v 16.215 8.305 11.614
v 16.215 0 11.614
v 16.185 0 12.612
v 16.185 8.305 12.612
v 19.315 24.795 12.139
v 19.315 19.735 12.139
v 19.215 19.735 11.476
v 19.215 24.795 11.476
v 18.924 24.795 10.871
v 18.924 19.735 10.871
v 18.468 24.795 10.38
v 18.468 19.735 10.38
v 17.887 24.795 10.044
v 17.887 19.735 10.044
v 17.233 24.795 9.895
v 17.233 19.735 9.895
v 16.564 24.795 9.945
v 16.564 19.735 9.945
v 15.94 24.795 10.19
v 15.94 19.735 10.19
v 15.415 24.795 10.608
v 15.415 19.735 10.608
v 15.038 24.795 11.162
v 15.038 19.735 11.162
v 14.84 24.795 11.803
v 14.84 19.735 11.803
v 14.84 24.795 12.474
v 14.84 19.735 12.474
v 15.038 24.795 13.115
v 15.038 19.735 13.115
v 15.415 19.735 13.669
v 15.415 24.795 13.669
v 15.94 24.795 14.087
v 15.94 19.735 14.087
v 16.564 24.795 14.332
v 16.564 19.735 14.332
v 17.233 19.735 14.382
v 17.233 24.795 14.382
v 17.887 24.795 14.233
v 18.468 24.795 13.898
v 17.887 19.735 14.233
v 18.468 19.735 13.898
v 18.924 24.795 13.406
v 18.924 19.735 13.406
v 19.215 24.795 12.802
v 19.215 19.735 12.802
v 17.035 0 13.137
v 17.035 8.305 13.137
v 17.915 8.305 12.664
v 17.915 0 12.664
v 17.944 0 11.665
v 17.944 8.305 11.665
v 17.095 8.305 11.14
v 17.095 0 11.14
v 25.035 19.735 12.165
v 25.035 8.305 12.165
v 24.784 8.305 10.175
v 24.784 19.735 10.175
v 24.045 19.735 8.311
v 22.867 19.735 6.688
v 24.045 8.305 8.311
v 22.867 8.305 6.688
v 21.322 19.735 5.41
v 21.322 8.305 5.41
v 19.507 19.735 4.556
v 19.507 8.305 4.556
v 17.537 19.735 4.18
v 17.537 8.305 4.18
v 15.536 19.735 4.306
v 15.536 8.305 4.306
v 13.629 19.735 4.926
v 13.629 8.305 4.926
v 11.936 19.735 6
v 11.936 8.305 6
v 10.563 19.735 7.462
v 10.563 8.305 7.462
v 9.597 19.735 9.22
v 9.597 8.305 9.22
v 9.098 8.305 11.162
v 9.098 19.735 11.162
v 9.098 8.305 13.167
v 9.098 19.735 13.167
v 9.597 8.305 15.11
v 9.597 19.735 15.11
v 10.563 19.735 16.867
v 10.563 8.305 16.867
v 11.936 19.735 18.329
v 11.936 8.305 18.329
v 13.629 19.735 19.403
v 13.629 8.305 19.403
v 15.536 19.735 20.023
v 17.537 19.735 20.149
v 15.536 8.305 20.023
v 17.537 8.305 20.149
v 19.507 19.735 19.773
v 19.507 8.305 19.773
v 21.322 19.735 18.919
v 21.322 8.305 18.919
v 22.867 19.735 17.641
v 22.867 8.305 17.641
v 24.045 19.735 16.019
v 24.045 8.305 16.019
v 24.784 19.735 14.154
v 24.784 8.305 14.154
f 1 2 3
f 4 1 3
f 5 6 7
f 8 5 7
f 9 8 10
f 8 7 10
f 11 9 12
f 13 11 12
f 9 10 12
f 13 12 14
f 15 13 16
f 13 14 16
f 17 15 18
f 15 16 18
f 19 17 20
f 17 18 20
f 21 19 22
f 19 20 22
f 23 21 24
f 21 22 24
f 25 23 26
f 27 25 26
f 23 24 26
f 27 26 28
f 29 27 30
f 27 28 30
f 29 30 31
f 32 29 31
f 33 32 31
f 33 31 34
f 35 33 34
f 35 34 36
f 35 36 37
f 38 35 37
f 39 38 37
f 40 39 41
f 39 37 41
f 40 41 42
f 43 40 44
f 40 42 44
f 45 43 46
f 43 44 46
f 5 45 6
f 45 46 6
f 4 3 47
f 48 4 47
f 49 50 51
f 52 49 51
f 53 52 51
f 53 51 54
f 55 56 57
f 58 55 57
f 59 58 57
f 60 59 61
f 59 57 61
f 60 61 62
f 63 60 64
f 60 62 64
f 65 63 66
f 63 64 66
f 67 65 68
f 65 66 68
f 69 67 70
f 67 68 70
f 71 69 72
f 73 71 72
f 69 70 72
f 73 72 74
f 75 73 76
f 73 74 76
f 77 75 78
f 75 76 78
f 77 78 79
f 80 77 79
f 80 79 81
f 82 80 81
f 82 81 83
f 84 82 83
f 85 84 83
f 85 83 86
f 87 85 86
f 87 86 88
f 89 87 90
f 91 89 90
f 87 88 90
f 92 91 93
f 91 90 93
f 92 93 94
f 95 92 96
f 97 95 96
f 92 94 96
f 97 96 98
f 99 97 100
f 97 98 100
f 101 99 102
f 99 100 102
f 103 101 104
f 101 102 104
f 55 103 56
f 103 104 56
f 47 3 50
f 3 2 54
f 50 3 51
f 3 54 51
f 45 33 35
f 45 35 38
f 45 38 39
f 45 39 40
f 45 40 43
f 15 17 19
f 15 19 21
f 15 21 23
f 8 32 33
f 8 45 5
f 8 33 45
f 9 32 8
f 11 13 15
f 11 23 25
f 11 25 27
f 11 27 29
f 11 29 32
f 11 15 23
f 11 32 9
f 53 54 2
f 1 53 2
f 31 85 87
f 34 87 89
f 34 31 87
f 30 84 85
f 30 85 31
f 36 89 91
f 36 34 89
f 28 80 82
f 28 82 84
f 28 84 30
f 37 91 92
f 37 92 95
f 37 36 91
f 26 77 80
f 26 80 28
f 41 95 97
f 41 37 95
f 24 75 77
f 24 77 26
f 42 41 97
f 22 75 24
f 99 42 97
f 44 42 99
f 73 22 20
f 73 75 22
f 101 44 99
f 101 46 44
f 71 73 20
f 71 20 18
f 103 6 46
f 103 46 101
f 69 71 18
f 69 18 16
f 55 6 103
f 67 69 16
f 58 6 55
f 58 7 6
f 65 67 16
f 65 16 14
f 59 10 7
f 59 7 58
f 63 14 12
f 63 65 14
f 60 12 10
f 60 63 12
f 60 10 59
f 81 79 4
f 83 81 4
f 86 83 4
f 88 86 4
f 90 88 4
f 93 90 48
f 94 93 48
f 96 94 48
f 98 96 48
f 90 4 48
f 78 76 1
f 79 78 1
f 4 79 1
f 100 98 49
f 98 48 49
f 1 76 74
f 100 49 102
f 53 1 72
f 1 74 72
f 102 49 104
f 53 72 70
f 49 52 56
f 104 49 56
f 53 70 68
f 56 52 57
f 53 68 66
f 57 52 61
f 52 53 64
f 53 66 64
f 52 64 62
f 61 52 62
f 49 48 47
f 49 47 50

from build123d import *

# Parameters (mm, degrees)
BOSS_EXTRUDE1_DEPTH = 8.305
SKETCH2_R           = 8
BOSS_EXTRUDE2_DEPTH = 11.43
SKETCH3_R           = 2.25
BOSS_EXTRUDE3_DEPTH = 5.06


with BuildPart() as part:
    # Sketch1 → Boss-Extrude1 (new body)
    with BuildSketch(Plane(origin=(0, 0, 0), x_dir=(1, 0, 0), z_dir=(0, 1, 0))):
        Polygon((17.034949463, -13.137071019), (17.914502801, -12.66376429), (17.944383819, -11.665395391), (17.094711499, -11.140333221), (16.215158161, -11.61363995), (16.185277144, -12.612008849), align=None)
    extrude(amount=BOSS_EXTRUDE1_DEPTH)

    # Sketch2 → Boss-Extrude2 (add)
    with BuildSketch(Plane(origin=(0, 8.305, 0), x_dir=(1, 0, 0), z_dir=(0, 1, 0))):
        with Locations((17.034949463, -12.16457984)):
            Circle(SKETCH2_R)
    extrude(amount=BOSS_EXTRUDE2_DEPTH)

    # Sketch3 → Boss-Extrude3 (add)
    with BuildSketch(Plane(origin=(0, 19.735, 0), x_dir=(1, 0, 0), z_dir=(0, 1, 0))):
        with Locations((17.064830481, -12.13870212)):
            Circle(SKETCH3_R)
    extrude(amount=BOSS_EXTRUDE3_DEPTH)


solid = part.part
